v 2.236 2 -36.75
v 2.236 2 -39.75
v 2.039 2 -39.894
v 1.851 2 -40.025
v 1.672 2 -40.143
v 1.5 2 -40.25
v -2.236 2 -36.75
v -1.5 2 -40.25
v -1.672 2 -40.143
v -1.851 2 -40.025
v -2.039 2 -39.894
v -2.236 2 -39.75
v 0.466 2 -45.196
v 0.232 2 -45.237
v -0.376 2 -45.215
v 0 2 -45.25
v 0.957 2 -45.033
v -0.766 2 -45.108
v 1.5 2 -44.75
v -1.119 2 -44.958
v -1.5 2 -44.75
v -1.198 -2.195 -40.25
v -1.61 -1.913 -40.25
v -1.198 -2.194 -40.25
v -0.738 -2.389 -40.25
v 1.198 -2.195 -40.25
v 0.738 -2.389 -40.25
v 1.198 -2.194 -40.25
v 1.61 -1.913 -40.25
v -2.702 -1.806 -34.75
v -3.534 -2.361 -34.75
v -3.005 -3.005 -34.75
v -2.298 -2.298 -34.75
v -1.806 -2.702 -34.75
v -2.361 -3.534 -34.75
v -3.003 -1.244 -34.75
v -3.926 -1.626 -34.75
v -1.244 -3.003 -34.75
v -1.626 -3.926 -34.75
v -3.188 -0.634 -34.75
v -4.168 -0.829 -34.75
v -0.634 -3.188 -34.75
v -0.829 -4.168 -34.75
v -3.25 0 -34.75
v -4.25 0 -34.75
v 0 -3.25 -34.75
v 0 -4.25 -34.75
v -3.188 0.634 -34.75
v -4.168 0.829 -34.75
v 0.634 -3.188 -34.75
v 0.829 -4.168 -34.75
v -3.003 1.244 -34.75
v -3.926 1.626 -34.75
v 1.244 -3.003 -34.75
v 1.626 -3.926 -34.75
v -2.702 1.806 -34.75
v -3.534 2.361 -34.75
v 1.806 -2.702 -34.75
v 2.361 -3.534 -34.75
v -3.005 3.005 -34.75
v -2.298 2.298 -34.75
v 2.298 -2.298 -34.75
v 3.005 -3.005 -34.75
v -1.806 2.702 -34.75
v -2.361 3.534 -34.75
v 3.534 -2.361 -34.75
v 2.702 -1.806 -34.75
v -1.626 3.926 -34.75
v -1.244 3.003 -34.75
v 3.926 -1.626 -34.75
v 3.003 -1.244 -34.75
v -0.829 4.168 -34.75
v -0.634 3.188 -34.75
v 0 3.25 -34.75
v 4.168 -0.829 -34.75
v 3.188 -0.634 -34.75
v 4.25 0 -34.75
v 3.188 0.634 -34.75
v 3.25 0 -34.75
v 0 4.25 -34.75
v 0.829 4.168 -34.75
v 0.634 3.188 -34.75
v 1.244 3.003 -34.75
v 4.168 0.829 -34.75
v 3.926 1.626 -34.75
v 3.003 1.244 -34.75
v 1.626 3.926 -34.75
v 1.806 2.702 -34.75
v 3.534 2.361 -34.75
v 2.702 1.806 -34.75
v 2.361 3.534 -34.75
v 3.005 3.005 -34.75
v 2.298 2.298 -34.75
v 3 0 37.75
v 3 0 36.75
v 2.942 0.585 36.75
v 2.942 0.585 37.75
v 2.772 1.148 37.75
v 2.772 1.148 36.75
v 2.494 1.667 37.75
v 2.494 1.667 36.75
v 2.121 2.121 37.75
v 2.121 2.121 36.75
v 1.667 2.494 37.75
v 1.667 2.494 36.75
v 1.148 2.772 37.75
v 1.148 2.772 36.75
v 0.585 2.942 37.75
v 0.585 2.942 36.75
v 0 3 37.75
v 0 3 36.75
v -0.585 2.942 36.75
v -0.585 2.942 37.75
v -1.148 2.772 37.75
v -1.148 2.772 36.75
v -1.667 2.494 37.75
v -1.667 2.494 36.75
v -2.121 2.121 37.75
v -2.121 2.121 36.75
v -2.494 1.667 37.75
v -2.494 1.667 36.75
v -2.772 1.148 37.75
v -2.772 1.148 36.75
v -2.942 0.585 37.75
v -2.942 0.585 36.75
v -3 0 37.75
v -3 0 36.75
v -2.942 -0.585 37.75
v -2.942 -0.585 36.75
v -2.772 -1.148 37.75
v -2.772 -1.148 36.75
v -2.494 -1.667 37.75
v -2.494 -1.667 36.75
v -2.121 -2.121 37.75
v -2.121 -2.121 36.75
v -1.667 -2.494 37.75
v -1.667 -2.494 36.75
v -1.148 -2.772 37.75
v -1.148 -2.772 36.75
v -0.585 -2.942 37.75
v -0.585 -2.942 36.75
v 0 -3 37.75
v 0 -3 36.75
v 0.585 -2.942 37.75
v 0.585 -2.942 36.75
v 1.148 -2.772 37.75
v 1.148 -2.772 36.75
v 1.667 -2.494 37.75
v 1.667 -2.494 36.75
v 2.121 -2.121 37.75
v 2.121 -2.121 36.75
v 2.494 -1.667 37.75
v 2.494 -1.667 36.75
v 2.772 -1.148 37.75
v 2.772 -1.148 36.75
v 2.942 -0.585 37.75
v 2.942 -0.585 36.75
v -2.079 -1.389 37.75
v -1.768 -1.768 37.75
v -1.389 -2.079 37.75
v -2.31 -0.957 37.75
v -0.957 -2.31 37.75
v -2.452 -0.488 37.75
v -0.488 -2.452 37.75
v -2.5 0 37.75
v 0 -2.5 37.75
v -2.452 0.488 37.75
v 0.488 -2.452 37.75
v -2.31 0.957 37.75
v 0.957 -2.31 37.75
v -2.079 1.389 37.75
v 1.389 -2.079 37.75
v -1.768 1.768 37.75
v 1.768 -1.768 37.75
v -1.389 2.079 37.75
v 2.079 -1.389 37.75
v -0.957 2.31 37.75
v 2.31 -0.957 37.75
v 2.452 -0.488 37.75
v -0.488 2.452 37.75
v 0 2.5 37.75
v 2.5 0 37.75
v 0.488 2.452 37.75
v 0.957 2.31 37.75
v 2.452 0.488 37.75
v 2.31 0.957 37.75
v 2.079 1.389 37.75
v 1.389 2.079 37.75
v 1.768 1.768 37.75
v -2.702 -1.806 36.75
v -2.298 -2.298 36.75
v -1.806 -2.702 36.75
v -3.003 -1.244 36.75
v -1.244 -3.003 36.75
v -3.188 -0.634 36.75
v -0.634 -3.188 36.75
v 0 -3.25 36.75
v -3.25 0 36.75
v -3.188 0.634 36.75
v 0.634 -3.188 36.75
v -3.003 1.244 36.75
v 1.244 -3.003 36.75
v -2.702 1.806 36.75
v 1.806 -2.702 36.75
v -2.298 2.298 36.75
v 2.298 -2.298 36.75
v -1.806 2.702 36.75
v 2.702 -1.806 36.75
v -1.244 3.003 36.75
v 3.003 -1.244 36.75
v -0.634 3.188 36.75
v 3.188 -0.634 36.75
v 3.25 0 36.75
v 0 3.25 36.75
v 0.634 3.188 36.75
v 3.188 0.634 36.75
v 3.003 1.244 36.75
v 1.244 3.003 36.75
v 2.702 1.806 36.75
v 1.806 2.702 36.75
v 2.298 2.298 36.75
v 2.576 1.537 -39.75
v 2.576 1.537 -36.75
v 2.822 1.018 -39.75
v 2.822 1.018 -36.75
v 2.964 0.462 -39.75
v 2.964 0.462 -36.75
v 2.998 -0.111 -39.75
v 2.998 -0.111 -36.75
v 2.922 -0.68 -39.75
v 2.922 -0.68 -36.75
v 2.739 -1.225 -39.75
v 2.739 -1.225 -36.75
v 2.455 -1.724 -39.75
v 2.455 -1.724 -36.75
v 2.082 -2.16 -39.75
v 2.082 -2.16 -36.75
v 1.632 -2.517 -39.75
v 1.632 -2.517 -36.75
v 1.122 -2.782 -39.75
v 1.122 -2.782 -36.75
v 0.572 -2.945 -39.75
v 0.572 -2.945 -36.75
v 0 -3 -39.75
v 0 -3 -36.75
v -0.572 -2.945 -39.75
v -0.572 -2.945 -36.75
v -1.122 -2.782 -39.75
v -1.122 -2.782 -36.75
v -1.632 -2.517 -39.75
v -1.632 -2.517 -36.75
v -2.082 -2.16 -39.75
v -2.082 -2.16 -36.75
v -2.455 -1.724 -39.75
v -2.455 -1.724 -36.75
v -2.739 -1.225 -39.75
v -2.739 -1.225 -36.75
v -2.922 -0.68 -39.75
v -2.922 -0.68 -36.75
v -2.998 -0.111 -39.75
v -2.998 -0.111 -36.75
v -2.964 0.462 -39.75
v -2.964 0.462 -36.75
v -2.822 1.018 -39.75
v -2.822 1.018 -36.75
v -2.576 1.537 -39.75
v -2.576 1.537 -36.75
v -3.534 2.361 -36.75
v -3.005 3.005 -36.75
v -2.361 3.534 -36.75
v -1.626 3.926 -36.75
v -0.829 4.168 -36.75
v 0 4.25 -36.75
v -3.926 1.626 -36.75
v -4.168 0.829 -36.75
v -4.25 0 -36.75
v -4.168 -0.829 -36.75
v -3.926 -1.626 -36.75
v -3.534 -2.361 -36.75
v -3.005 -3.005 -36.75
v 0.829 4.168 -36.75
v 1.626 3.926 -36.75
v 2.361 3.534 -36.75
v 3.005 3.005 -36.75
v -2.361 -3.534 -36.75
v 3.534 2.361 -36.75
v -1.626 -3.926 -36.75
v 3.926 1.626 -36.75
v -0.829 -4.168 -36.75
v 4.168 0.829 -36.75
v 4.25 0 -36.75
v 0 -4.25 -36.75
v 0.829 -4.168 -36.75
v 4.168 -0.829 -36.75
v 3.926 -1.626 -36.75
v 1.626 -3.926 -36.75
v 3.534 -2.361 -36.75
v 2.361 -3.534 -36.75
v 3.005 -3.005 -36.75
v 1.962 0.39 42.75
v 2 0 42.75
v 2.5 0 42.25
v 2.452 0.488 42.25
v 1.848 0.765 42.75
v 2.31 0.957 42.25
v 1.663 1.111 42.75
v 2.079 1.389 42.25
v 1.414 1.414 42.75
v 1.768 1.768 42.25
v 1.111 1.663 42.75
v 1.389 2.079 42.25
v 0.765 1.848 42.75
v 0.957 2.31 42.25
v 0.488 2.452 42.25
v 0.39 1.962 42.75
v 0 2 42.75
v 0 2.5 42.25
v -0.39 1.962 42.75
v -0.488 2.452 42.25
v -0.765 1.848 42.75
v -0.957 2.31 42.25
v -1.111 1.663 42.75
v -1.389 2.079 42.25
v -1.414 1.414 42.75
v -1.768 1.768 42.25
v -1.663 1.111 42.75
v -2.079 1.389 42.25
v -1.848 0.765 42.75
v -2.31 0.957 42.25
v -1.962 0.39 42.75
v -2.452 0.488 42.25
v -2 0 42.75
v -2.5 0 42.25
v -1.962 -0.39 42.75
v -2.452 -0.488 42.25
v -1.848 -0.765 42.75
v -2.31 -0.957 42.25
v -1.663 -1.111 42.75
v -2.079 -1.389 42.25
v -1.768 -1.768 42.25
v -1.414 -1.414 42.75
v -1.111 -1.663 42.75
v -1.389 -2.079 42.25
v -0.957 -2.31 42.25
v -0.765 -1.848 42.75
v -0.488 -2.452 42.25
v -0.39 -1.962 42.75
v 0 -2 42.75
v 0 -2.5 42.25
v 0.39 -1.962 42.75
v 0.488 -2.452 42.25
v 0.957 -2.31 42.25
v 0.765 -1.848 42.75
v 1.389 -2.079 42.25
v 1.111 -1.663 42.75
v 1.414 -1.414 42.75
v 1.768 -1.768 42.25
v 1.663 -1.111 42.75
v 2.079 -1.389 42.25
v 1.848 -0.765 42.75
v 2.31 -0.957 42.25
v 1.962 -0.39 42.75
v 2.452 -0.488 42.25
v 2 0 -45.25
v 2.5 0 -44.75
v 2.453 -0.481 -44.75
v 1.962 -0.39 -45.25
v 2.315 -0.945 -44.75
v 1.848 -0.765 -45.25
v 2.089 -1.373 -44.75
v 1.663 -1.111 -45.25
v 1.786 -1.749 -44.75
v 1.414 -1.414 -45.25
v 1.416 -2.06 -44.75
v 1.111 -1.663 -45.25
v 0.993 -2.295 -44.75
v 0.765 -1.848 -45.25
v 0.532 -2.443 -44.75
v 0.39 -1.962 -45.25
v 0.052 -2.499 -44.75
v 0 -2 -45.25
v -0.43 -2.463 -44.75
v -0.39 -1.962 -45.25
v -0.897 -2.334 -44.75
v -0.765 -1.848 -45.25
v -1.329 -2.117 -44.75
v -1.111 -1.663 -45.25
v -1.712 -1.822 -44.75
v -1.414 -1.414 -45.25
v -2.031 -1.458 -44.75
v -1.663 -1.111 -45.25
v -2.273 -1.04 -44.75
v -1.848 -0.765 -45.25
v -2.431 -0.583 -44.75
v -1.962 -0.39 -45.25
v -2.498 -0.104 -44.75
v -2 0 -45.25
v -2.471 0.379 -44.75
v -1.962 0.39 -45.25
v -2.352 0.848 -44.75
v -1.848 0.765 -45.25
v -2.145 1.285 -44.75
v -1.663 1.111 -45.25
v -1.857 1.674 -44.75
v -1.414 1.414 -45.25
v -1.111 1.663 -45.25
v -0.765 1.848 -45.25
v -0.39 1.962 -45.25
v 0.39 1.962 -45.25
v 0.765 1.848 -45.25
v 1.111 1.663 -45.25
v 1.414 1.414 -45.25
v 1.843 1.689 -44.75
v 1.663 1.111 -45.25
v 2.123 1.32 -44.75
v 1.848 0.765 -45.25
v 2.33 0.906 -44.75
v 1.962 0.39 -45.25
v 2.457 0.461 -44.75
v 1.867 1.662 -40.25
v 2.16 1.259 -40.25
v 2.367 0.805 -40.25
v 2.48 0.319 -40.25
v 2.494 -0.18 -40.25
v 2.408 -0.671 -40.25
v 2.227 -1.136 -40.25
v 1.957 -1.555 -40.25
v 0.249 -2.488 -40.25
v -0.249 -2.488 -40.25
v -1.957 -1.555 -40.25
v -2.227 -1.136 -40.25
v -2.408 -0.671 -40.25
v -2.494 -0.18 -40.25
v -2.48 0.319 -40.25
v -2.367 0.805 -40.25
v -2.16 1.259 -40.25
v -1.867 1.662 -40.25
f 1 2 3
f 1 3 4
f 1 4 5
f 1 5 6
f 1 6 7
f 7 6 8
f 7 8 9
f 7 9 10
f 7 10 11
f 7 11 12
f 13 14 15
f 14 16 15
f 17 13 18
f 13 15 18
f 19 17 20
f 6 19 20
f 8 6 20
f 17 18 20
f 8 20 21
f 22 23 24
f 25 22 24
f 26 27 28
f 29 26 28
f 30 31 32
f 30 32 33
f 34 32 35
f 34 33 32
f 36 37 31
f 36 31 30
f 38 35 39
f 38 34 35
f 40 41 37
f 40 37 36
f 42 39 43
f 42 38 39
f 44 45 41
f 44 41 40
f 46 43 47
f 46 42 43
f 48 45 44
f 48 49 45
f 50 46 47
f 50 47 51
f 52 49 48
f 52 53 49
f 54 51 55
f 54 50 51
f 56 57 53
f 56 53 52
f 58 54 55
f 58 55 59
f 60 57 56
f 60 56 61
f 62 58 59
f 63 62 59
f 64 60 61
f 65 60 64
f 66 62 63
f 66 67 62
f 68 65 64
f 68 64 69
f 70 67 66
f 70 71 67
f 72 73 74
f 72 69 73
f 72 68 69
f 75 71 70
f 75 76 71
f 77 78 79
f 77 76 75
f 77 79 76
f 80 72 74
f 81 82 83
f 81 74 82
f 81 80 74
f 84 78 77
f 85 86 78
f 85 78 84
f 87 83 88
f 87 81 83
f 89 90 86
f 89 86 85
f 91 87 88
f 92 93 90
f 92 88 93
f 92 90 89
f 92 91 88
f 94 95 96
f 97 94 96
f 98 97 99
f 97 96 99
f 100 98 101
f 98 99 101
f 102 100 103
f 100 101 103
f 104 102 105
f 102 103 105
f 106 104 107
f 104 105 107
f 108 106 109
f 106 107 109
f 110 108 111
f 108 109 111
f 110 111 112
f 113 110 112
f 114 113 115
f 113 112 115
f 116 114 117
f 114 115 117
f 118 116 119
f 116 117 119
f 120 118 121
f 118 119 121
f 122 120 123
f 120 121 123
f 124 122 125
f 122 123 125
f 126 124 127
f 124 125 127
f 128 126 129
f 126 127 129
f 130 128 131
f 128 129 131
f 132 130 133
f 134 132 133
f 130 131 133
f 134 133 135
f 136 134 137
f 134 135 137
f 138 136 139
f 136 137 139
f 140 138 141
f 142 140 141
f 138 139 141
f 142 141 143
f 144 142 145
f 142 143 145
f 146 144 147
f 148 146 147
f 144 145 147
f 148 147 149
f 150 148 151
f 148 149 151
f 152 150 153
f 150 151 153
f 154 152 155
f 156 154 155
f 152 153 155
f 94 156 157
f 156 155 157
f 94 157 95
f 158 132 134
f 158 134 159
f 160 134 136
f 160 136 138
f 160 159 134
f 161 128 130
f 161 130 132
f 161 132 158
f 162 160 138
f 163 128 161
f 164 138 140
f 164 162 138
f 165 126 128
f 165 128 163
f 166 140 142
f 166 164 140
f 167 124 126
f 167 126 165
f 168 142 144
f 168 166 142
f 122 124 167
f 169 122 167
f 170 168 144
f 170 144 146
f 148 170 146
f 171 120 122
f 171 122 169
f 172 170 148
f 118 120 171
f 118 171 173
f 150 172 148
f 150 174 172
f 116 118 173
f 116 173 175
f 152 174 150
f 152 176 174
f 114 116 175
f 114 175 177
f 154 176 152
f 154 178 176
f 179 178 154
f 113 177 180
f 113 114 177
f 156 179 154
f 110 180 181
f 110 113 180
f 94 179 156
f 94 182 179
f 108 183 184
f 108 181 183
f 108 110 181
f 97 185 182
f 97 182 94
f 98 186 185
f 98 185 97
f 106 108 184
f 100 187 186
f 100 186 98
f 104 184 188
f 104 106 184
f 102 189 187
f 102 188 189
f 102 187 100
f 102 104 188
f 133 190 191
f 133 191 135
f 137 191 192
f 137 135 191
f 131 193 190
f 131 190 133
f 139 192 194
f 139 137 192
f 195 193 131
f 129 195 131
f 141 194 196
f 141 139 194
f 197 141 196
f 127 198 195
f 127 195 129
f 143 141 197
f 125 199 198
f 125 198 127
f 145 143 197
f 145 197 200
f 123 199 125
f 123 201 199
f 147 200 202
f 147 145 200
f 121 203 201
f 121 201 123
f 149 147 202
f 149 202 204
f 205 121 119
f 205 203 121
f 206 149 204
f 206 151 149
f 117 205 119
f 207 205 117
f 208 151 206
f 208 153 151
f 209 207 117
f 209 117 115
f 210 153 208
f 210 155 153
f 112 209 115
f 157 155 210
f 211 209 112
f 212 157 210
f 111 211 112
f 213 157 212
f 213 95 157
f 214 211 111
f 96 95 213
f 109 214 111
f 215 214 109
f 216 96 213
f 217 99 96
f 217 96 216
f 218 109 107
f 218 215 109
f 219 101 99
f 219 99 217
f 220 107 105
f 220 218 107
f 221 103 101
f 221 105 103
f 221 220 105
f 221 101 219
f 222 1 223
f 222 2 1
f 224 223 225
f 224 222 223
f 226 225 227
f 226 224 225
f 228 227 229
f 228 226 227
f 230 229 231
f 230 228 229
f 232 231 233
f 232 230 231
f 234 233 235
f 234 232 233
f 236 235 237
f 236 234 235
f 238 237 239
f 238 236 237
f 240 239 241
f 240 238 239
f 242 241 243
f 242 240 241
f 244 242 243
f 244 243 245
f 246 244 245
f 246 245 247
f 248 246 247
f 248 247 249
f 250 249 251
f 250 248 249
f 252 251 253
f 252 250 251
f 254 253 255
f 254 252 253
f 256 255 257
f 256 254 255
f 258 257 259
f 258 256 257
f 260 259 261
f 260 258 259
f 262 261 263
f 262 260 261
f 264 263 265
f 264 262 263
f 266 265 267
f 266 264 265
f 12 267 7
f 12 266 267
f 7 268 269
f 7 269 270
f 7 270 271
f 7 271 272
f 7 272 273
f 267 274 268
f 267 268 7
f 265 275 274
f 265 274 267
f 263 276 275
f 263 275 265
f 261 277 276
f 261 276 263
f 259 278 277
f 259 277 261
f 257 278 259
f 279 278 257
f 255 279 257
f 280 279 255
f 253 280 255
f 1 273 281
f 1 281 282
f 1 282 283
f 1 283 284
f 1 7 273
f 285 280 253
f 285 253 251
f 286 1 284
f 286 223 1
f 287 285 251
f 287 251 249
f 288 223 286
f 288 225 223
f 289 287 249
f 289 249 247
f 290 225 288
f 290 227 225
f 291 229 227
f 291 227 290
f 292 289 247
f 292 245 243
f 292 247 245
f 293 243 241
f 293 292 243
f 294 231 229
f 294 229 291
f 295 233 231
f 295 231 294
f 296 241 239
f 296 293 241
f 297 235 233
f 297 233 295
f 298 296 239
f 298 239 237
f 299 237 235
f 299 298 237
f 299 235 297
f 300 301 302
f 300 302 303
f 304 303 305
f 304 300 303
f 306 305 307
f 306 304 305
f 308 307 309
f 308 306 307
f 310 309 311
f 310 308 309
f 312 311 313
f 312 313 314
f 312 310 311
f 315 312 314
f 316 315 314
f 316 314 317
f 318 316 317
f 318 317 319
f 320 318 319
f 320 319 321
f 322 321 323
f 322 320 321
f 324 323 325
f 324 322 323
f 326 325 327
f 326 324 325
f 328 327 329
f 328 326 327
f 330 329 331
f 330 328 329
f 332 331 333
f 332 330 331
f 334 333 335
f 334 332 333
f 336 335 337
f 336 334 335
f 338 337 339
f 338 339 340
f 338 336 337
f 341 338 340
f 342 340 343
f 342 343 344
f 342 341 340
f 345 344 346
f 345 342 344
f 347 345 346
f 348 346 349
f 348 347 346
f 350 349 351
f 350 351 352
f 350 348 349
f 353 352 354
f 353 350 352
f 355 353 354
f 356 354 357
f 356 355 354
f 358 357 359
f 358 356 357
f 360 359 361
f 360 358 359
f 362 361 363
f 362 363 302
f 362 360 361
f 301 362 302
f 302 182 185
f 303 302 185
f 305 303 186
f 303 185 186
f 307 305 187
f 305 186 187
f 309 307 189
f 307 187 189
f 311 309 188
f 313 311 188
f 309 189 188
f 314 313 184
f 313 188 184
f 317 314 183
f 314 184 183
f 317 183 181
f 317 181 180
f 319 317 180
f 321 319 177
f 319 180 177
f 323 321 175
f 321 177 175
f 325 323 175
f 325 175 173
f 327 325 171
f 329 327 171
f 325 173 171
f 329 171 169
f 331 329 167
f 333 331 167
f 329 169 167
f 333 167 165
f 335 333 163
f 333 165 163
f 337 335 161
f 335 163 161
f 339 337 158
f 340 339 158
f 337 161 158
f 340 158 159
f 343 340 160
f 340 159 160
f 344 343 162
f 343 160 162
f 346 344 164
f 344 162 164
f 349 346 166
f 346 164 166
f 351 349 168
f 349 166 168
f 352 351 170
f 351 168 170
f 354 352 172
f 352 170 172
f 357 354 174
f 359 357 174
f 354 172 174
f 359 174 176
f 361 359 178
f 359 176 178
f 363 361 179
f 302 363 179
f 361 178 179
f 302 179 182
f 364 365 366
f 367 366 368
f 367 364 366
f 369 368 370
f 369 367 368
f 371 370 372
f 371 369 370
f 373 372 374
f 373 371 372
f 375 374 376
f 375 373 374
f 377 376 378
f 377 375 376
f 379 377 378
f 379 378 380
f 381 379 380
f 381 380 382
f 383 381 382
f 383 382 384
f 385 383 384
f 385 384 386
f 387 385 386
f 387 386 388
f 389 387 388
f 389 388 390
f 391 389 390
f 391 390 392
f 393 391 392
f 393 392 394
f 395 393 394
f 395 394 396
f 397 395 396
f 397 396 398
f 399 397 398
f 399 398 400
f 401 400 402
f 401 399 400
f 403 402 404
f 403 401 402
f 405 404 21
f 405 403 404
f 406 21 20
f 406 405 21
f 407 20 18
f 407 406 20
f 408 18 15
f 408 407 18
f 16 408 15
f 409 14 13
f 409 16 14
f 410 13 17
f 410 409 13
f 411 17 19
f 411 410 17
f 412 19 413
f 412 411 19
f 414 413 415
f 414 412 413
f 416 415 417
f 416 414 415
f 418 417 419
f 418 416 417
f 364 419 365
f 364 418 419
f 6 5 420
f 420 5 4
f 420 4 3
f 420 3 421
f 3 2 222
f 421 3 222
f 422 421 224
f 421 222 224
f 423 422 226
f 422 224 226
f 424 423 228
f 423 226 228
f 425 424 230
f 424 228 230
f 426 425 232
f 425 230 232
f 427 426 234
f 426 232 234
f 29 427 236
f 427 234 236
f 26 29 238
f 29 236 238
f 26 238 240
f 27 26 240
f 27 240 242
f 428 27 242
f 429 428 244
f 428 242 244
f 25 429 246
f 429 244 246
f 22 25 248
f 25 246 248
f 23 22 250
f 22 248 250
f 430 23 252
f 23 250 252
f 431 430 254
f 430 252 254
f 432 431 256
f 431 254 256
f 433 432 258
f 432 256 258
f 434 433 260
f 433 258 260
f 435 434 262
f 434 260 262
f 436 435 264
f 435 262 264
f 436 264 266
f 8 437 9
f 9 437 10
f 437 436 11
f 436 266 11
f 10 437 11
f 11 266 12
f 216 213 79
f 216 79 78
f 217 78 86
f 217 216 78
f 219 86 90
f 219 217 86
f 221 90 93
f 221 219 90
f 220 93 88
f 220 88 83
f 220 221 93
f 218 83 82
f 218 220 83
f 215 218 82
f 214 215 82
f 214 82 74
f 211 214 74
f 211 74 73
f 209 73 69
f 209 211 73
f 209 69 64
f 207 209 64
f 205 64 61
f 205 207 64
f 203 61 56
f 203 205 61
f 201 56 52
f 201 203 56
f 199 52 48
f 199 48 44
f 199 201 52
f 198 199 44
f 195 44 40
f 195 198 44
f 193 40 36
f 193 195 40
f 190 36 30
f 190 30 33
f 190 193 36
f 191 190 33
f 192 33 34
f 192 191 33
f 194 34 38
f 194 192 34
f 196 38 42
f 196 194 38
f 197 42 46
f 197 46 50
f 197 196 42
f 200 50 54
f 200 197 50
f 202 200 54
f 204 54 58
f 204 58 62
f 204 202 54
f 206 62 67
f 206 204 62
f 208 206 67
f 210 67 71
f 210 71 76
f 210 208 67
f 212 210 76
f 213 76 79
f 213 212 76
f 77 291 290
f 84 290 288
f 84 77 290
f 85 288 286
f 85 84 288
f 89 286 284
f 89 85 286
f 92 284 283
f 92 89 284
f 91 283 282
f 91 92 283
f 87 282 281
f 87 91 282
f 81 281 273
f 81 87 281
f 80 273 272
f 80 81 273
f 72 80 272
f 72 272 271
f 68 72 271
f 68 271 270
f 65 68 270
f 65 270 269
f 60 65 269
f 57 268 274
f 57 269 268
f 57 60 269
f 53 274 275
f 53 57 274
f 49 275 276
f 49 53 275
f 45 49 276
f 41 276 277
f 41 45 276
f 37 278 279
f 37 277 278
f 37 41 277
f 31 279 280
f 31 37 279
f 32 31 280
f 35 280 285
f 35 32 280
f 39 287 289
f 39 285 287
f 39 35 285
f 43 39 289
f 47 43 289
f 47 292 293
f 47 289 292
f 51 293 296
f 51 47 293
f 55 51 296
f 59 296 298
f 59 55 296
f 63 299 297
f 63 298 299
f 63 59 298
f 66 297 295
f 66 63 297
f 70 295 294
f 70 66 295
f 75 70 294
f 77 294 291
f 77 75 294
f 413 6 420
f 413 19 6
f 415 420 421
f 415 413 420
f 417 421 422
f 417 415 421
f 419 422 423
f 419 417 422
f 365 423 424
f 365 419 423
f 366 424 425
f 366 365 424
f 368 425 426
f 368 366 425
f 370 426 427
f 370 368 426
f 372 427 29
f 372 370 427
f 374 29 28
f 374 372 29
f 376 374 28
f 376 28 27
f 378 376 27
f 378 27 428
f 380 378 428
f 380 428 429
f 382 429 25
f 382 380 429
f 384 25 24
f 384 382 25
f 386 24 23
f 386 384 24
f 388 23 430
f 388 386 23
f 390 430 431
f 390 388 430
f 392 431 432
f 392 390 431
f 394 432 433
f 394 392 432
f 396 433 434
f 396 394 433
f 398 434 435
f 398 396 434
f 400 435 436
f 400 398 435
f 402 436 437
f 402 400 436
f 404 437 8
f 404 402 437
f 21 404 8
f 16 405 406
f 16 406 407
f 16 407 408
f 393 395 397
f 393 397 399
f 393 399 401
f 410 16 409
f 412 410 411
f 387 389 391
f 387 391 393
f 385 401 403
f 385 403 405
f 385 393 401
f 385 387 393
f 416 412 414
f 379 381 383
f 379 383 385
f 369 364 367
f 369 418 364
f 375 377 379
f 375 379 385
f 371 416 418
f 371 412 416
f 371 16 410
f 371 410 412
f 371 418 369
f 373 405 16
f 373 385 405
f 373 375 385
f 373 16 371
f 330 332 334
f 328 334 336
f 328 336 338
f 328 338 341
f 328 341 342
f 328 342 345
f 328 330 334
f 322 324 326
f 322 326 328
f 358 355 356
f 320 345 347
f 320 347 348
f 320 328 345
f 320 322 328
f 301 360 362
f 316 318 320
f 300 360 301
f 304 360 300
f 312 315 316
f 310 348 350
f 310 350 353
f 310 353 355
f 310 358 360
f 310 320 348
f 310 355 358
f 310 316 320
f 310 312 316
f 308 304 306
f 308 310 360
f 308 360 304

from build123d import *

# Parameters (mm, degrees)
SKETCH_1_R          = 4.25
EXTRUDE_1_DEPTH     = 36.75
SKETCH_2_R          = 3
EXTRUDE_2_DEPTH     = 1
SKETCH_3_R          = 2.5
EXTRUDE_3_DEPTH     = 5
EXTRUDE_START       = 3.5
SKETCH_4_R          = 3
EXTRUDE_4_DEPTH     = 3.5
EXTRUDE_START_2     = 5
SKETCH_5_R          = 2.5
EXTRUDE_5_DEPTH     = 5
CHAMFER_1_SIZE      = 0.5
CHAMFER_2_SIZE      = 0.5
CUT_EXTRUDE_6_REACH = 90.205
SKETCH_6_W          = 6
SKETCH_6_H          = 3
SKETCH_7_R          = 4.25
SKETCH_7_R_2        = 3.25
CUT_EXTRUDE_1_DEPTH = 71.5


with BuildPart() as part:
    # 草图1 → 拉伸1 (new, symmetric)
    with BuildSketch(Plane.XY):
        Circle(SKETCH_1_R)
    extrude(amount=EXTRUDE_1_DEPTH, both=True)

    # 草图2 → 拉伸2 (add)
    with BuildSketch(Plane.XY.offset(36.75)):
        Circle(SKETCH_2_R)
    extrude(amount=EXTRUDE_2_DEPTH)

    # 草图3 → 拉伸3 (add)
    with BuildSketch(Plane.XY.offset(37.75)):
        Circle(SKETCH_3_R)
    extrude(amount=EXTRUDE_3_DEPTH)

    # 草图4 → 拉伸4 (add)
    with BuildSketch(Plane(origin=(0, 0, -36.75), x_dir=(-1, 0, 0), z_dir=(0, 0, -1)).offset(EXTRUDE_START)):
        with Locations(Location((0, 0, 0), (0, 0, 180))):
            Circle(SKETCH_4_R)
    extrude(amount=-EXTRUDE_4_DEPTH)

    # 草图5 → 拉伸5 (add)
    with BuildSketch(Plane(origin=(0, 0, -40.25), x_dir=(-1, 0, 0), z_dir=(0, 0, -1)).offset(EXTRUDE_START_2)):
        with Locations(Location((0, 0, 0), (0, 0, 180))):
            Circle(SKETCH_5_R)
    extrude(amount=-EXTRUDE_5_DEPTH)

    # 倒角1
    chamfer_1_edges = [part.edges().sort_by_distance(p)[0] for p in [
        (-2.5, 0, 42.75),
        (-2.5, 0, -45.25),
    ]]
    chamfer(chamfer_1_edges, length=CHAMFER_1_SIZE)

    # 倒角2
    chamfer_2_edges = [part.edges().sort_by_distance(p)[0] for p in [
        (-3, 0, -40.25),
    ]]
    chamfer(chamfer_2_edges, length=CHAMFER_2_SIZE - 0.0001)  # a hair under: the kernel refuses the full size

    # 拉伸6: up to this face of the body (flat: up to its plane)
    cut_extrude_6_end = Plane(part.part.faces().sort_by_distance((-4.129791847, 0, -36.75))[0])
    # 草图6 → 拉伸6 (cut, up to the picked face)
    with BuildSketch(Plane(origin=(0, 0, -45.25), x_dir=(-1, 0, 0), z_dir=(0, 0, -1)), mode=Mode.PRIVATE) as cut_extrude_6_sk1:
        with Locations((0, 3.5)):
            Rectangle(SKETCH_6_W, SKETCH_6_H)
    cut_extrude_6_tool1 = split(extrude(cut_extrude_6_sk1.sketch, amount=-CUT_EXTRUDE_6_REACH, mode=Mode.PRIVATE), bisect_by=cut_extrude_6_end, keep=Keep.BOTH, mode=Mode.PRIVATE)
    add(cut_extrude_6_tool1.solids().sort_by(Axis((0, 3.5, -45.25), (0, 0, 1)))[0], mode=Mode.SUBTRACT)

    # 草图7 → 切除-拉伸1 (cut)
    with BuildSketch(Plane.XY.offset(36.75)):
        Circle(SKETCH_7_R)
        Circle(SKETCH_7_R_2, mode=Mode.SUBTRACT)
    extrude(amount=-CUT_EXTRUDE_1_DEPTH, mode=Mode.SUBTRACT)


solid = part.part
